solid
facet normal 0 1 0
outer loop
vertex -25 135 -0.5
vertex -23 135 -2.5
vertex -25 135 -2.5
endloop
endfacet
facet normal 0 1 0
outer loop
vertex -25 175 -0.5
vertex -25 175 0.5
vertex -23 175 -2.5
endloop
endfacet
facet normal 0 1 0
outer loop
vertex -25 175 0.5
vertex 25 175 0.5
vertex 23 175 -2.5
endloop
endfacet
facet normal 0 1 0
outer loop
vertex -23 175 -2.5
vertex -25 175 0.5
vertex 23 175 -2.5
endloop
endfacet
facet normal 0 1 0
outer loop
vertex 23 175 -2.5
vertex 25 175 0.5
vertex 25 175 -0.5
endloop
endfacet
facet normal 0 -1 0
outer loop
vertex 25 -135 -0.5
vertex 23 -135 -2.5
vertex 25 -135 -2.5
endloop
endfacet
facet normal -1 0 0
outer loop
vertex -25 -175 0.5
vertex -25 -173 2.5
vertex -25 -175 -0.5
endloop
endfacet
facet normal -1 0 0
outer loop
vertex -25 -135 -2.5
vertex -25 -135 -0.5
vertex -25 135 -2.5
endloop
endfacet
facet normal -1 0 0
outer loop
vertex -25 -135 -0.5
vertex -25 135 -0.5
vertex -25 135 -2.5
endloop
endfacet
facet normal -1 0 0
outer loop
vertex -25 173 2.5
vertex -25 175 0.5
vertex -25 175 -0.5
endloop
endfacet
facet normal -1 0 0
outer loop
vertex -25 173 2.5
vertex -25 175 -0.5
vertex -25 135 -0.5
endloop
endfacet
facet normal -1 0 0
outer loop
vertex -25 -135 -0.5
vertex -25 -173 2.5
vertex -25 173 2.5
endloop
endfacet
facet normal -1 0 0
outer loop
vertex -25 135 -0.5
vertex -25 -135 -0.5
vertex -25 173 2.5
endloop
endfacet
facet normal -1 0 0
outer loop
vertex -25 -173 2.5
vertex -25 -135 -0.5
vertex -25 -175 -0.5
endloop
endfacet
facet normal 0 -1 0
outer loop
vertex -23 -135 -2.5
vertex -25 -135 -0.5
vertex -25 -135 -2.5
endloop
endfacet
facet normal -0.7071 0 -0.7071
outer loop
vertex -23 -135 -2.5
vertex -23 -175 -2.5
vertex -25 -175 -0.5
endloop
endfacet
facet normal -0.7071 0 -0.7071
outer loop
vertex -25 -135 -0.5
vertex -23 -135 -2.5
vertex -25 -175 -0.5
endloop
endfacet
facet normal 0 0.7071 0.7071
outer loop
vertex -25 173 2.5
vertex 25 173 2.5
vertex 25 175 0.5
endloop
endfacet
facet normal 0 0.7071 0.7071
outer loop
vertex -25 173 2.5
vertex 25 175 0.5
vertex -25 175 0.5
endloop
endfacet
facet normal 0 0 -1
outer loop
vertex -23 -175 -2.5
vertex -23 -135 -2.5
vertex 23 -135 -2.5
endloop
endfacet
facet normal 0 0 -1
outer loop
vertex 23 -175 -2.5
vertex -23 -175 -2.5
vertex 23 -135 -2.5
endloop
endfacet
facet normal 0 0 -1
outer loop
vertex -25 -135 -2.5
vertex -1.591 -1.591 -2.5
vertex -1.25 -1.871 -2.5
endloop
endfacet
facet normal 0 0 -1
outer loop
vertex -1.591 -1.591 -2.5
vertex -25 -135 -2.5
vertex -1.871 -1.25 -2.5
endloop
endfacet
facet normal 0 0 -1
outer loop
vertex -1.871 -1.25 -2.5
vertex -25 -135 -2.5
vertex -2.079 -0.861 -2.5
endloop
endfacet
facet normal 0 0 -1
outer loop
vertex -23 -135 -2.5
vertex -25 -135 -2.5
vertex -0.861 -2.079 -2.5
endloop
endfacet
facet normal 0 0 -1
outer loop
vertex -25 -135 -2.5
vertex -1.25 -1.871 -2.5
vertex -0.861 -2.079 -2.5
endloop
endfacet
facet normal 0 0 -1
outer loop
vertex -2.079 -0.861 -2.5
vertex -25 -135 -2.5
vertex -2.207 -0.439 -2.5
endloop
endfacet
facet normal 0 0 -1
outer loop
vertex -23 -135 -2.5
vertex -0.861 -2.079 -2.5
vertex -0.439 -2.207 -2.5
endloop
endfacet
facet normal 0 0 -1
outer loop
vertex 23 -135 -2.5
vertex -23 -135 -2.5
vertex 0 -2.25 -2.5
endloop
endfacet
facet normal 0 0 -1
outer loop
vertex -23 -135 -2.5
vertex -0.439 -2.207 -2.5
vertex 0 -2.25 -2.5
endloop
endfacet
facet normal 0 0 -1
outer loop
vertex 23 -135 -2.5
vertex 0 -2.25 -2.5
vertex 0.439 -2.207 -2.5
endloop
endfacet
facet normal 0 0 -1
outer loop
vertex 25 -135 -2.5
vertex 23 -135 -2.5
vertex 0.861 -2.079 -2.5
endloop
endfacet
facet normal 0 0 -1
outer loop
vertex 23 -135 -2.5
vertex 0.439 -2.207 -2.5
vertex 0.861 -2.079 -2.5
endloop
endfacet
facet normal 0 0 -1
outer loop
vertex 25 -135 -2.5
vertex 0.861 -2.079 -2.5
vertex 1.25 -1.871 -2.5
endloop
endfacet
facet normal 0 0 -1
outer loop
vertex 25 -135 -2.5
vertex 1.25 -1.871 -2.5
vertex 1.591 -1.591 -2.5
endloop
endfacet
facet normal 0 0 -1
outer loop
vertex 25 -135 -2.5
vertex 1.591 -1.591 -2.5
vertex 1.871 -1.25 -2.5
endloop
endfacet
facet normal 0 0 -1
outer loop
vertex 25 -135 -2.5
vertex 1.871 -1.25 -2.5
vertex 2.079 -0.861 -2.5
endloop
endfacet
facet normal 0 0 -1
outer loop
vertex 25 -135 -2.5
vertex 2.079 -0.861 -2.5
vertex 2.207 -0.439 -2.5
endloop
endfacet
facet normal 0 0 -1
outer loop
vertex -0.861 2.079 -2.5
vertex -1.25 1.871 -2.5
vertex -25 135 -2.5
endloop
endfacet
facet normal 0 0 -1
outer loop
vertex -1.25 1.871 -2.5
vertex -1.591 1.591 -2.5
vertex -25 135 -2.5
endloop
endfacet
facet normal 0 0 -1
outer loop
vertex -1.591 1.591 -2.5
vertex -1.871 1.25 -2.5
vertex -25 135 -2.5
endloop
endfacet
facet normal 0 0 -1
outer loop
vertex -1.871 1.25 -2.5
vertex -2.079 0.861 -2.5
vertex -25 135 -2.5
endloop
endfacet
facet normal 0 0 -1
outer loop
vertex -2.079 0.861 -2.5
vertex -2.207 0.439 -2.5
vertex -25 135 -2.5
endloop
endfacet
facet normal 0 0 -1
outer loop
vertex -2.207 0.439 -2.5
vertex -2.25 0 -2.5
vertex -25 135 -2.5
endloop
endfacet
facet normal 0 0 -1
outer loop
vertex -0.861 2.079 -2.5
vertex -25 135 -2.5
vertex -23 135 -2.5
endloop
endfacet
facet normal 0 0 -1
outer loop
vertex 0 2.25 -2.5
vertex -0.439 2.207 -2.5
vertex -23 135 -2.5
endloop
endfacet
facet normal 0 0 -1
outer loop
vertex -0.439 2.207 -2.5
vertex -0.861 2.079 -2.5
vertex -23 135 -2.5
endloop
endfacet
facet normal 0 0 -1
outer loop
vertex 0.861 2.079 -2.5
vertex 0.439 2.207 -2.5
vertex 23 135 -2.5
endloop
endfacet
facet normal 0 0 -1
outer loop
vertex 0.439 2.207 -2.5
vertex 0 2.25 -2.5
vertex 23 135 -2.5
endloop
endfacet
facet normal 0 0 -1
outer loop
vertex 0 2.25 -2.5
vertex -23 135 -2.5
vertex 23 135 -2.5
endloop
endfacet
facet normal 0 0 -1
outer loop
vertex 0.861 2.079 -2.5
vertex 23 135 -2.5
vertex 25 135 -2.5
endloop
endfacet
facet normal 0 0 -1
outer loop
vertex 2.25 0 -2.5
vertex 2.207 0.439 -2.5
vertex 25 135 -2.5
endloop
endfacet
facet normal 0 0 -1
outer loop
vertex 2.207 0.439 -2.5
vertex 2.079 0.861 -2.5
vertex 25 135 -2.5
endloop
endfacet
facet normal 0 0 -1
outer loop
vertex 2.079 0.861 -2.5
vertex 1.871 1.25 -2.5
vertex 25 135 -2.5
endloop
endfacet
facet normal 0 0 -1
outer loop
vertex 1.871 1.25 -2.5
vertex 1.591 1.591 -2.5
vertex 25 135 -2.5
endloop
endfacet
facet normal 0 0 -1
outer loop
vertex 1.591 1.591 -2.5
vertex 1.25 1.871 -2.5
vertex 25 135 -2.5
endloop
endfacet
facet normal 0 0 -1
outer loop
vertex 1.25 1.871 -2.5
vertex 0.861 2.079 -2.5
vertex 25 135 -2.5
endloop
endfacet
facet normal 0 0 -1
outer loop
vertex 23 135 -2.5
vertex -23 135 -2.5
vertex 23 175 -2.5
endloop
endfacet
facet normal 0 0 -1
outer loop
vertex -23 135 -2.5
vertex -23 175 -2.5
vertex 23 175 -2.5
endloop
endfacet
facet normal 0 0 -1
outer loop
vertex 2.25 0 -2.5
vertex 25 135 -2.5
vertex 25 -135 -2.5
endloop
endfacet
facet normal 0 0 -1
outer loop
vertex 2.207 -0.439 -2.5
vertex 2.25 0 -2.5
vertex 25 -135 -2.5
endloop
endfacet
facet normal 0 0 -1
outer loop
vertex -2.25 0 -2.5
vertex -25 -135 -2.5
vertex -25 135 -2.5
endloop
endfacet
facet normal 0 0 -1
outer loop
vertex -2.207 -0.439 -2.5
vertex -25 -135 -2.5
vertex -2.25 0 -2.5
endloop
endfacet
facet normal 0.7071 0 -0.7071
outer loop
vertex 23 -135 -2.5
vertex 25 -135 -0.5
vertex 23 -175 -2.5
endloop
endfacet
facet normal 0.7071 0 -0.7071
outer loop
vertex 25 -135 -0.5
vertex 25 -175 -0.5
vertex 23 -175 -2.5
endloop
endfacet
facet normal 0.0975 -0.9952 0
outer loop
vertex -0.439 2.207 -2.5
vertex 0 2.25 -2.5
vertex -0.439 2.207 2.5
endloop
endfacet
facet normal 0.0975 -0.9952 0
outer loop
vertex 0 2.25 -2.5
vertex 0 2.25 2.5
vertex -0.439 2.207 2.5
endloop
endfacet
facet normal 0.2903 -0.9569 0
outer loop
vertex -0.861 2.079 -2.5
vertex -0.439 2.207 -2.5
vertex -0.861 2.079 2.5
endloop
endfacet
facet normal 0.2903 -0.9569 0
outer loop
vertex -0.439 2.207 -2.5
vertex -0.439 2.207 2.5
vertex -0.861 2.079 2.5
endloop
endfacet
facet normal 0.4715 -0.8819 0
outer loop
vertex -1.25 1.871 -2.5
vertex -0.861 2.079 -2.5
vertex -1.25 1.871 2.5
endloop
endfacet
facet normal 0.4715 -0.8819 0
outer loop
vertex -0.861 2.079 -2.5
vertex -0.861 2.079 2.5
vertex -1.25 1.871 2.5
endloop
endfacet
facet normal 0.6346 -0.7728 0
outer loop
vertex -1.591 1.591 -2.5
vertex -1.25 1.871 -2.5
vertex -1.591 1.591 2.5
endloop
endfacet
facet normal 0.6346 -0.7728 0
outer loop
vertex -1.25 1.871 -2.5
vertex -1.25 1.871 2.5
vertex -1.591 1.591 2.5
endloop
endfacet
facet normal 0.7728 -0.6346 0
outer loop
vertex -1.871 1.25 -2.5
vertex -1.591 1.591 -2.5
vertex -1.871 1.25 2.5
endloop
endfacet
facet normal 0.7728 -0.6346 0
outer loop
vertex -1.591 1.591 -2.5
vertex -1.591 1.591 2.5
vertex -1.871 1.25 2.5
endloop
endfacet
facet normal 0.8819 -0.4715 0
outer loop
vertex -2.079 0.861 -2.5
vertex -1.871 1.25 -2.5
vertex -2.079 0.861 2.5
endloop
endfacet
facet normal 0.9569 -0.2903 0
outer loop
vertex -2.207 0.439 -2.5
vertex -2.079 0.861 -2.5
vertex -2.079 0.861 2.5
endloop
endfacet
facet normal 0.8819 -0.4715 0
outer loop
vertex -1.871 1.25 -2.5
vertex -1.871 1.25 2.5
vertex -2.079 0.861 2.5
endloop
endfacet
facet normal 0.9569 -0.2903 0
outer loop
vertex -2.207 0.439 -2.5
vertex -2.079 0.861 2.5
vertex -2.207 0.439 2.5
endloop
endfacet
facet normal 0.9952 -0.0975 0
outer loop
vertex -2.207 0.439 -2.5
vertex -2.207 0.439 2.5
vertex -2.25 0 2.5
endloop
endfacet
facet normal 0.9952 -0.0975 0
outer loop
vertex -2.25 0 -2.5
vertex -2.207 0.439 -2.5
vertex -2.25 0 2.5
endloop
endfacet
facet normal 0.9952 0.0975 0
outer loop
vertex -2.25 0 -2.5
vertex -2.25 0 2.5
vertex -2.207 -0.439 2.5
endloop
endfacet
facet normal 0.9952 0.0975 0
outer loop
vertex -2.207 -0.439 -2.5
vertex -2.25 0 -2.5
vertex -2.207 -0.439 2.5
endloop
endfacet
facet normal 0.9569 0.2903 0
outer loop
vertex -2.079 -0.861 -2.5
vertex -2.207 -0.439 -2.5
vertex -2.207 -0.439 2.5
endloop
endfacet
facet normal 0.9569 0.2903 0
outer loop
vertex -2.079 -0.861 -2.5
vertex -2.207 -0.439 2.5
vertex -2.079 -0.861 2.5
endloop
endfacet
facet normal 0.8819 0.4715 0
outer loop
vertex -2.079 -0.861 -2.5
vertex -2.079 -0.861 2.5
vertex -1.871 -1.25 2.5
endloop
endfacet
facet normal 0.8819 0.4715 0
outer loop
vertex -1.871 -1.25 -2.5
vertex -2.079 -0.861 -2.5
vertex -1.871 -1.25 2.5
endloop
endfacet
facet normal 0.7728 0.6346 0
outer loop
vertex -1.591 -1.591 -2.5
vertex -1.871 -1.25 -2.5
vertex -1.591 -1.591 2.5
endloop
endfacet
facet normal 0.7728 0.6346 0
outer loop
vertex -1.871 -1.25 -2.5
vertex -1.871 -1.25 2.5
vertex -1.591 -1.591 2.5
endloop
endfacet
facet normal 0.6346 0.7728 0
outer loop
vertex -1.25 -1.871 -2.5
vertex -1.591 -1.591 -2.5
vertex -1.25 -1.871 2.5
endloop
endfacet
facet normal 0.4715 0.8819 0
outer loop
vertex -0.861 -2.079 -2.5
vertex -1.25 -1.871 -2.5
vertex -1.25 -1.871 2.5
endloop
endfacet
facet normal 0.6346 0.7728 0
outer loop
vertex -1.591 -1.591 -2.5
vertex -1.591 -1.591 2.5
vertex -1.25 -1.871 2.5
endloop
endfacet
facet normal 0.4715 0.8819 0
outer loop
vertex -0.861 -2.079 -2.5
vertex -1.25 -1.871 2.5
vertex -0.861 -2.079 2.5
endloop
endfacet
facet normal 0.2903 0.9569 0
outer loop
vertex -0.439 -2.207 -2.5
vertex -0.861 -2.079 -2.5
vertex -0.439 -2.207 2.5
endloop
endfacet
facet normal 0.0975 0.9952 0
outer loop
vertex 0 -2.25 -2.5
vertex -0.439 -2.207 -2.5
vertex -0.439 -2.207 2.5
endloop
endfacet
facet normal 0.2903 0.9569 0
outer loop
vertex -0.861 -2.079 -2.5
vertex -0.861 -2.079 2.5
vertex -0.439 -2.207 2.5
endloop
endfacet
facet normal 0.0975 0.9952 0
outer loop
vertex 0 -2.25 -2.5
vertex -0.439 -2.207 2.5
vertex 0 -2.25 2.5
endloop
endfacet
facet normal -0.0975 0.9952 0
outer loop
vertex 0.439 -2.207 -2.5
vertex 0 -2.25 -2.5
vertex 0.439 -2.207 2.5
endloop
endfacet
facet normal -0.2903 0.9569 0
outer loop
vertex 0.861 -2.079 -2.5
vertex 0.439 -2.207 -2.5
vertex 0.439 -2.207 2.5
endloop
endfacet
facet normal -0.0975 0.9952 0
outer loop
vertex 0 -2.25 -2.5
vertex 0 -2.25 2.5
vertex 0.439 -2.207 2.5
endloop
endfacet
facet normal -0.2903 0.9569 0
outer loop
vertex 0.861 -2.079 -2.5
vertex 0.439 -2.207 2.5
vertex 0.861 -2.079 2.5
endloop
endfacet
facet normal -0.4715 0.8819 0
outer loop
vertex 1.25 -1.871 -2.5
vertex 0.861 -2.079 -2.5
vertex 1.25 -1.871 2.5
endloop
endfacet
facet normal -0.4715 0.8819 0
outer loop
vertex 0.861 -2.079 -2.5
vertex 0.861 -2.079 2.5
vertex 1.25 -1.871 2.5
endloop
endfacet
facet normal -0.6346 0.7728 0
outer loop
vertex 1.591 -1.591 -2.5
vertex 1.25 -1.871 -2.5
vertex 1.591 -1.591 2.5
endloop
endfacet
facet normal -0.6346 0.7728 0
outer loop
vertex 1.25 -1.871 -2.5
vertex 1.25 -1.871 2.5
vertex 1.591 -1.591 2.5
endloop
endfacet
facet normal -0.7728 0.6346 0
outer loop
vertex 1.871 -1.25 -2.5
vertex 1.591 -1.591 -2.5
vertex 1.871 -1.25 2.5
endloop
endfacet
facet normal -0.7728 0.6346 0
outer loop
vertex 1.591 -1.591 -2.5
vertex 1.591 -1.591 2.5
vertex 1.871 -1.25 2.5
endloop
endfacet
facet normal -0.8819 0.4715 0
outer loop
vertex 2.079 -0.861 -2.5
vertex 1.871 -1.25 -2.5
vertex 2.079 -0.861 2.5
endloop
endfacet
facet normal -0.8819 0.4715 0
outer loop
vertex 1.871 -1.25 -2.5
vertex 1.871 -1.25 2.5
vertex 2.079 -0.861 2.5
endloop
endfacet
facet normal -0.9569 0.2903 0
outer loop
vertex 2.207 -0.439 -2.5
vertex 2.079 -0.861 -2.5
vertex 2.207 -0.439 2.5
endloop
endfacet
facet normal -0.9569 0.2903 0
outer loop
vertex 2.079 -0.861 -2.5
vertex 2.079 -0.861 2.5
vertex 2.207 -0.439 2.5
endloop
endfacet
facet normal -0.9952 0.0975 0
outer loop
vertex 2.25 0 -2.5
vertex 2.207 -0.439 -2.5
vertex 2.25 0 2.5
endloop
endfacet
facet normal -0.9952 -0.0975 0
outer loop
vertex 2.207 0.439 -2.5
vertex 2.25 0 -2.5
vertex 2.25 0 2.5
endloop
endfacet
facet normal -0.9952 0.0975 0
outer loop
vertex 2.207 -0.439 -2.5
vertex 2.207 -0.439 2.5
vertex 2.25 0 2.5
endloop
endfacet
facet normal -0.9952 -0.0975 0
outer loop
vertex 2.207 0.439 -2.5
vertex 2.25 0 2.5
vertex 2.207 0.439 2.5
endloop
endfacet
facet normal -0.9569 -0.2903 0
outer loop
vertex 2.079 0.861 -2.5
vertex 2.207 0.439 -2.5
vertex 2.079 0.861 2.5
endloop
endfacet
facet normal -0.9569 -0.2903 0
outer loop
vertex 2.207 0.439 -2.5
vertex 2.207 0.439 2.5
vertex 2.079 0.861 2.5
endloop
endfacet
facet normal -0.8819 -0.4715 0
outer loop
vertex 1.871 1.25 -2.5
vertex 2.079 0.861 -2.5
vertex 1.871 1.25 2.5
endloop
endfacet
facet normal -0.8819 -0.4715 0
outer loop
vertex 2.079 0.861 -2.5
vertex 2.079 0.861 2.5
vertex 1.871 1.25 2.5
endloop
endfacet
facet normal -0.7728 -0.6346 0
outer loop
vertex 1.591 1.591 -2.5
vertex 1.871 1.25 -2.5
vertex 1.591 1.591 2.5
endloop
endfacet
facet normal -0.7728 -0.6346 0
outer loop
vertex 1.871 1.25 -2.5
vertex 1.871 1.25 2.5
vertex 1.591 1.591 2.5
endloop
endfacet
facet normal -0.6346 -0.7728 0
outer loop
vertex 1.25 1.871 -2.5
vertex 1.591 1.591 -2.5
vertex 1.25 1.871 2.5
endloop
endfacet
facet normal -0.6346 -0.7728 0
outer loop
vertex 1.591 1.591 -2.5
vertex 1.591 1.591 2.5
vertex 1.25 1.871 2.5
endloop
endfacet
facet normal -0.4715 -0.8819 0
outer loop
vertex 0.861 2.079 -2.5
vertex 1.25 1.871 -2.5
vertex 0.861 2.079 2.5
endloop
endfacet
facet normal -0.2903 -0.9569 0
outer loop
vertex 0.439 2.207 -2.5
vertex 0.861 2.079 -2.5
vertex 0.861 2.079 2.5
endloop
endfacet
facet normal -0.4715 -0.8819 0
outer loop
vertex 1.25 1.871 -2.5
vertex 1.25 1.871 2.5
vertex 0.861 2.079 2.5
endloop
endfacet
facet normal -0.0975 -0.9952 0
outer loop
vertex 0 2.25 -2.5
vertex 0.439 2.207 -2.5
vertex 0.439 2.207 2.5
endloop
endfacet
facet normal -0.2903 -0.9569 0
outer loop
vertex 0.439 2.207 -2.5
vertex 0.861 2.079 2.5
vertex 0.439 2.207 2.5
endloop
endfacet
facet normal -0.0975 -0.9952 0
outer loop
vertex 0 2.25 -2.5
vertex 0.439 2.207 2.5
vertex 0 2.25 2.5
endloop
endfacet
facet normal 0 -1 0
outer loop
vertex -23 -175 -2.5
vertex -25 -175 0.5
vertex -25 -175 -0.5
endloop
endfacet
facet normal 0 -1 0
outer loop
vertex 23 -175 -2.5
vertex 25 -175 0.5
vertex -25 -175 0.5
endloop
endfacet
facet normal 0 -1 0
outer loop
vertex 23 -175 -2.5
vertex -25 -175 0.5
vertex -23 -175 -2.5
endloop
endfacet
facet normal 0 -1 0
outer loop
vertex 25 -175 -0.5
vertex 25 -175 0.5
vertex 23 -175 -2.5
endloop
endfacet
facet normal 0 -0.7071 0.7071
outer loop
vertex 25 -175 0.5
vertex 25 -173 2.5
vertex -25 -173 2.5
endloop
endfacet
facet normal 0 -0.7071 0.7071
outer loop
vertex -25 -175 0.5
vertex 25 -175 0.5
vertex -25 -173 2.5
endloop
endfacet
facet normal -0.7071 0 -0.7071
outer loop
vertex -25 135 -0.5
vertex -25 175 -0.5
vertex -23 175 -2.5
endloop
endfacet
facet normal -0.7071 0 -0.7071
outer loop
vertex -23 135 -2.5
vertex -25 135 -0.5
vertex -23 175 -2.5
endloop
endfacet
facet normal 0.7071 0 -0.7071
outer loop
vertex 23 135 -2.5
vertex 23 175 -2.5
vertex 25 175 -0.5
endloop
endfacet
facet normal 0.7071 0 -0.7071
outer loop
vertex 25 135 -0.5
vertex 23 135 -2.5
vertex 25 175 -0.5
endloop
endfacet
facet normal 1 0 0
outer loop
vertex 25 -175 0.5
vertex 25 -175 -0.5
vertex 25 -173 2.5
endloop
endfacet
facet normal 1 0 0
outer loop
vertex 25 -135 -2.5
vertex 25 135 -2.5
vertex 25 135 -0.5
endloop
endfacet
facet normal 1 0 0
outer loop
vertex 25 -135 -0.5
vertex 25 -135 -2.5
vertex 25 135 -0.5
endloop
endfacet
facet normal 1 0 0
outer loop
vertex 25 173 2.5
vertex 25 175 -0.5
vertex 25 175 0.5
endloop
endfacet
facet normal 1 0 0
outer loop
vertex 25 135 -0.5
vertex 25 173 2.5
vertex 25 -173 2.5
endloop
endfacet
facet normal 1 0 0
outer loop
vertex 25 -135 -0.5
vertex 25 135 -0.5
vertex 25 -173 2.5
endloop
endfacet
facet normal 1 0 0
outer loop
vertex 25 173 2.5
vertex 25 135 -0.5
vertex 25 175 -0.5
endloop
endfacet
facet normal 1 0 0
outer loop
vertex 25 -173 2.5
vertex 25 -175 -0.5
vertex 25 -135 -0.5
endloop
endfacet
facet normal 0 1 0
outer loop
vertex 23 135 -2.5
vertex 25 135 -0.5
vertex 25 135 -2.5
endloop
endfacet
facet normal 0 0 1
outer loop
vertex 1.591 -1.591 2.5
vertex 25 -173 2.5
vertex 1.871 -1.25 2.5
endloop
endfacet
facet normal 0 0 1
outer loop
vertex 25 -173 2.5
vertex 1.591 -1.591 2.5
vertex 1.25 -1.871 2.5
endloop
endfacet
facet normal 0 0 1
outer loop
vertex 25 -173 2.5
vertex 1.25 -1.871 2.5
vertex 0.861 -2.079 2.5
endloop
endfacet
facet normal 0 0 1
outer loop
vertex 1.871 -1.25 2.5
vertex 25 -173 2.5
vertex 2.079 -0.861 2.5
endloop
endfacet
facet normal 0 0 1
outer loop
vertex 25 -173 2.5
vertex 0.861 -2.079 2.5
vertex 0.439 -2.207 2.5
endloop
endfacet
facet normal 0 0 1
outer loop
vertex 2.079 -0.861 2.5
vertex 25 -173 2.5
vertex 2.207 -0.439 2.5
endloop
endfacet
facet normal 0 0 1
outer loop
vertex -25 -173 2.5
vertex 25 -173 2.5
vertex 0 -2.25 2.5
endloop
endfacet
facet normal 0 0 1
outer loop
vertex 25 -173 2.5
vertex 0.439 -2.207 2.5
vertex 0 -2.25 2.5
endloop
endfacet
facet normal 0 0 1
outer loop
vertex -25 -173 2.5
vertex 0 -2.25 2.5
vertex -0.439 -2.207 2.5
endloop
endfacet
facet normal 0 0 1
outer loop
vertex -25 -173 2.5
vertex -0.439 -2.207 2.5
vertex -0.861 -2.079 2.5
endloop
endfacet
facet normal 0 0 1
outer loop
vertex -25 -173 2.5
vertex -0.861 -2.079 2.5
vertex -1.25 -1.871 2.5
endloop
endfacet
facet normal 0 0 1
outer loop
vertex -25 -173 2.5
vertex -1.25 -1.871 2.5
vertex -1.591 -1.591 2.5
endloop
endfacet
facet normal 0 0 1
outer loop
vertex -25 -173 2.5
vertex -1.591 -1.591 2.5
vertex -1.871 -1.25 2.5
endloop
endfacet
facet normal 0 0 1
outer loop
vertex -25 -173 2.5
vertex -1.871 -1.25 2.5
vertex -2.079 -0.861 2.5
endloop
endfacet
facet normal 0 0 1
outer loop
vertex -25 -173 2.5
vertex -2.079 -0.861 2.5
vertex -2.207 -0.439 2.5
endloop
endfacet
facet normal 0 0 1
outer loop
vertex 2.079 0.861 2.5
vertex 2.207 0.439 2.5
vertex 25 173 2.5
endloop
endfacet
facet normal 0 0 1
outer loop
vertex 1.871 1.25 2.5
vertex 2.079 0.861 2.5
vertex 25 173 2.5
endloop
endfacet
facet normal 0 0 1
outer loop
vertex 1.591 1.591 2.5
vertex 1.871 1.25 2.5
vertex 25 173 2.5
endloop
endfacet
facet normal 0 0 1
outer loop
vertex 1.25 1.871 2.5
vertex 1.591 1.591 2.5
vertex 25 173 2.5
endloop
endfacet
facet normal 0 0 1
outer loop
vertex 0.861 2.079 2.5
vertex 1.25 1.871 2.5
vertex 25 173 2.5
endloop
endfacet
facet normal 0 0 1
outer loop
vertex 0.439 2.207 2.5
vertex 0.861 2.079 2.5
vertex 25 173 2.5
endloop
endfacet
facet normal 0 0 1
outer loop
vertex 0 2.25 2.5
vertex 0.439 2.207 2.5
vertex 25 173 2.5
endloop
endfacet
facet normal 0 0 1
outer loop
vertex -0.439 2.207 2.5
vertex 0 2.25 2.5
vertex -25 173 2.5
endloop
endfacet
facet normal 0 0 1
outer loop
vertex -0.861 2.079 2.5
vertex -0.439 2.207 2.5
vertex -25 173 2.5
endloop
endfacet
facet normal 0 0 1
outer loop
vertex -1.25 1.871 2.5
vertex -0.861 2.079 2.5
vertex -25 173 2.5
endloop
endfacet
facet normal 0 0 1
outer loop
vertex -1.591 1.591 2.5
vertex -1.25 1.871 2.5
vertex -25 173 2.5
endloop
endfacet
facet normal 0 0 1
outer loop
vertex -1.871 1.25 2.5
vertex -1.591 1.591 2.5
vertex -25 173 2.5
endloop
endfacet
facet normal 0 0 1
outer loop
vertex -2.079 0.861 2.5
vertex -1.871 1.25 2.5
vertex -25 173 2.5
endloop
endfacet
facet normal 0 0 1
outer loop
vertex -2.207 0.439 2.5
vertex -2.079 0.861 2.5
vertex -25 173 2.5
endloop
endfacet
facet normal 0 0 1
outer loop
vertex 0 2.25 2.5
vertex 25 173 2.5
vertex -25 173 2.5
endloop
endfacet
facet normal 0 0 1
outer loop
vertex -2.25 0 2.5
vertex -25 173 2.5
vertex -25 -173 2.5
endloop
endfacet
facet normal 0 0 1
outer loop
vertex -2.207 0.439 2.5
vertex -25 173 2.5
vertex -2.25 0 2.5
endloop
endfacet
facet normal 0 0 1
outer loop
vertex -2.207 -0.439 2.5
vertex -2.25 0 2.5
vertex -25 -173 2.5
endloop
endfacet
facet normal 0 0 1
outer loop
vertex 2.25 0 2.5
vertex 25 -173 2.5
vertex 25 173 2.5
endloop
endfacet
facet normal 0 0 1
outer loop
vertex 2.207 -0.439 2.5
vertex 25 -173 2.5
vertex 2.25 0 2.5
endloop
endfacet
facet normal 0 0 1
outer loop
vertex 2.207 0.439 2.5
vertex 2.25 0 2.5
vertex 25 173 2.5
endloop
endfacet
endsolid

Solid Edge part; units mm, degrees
sketch "Sketch1" plane through (0, 0, 0) normal (0, -1, 0) x (1, 0, 0)
  line L0 (-25, -2.5) -> (25, -2.5)
  line L1 (25, -2.5) -> (25, 2.5)
  line L2 (25, 2.5) -> (-25, 2.5)
  line L3 (-25, 2.5) -> (-25, -2.5)
  dimension "D1" = 50
  dimension "D2" = 5
extrude "Protrusion1" add sketch "Sketch1" along normal mid plane 350
sketch "Sketch2" plane through (0, 0, 2.5) normal (0, 0, 1) x (0, 1, 0)
  circle A0 centre (0, 0) radius 2.25
extrude "Cutout1" cut sketch "Sketch2" against normal through all
sketch "Sketch3" plane through (0, -175, 0) normal (0, -1, 0) x (1, 0, 0)
  line L0 (-23, -2.5) -> (-25, -0.5)
  line L1 (-25, -0.5) -> (-25, -2.5)
  line L2 (-25, -2.5) -> (-23, -2.5)
  dimension "D1" = 2
extrude "Extrusionsausschnitt_2" cut sketch "Sketch3" against normal blind 40
mirror "Mirror1" about plane through (0, 0, 0) normal (1, 0, 0) of "Extrusionsausschnitt_2"
mirror "Mirror2" about plane through (0, 0, 0) normal (0, -1, 0) of "Extrusionsausschnitt_2", "Mirror1"
chamfer "Fase_1" distance 2 angle 45 2 edges at (0, -175, 2.5) (0, 175, 2.5)
properties material "Aluminium, 1060"
